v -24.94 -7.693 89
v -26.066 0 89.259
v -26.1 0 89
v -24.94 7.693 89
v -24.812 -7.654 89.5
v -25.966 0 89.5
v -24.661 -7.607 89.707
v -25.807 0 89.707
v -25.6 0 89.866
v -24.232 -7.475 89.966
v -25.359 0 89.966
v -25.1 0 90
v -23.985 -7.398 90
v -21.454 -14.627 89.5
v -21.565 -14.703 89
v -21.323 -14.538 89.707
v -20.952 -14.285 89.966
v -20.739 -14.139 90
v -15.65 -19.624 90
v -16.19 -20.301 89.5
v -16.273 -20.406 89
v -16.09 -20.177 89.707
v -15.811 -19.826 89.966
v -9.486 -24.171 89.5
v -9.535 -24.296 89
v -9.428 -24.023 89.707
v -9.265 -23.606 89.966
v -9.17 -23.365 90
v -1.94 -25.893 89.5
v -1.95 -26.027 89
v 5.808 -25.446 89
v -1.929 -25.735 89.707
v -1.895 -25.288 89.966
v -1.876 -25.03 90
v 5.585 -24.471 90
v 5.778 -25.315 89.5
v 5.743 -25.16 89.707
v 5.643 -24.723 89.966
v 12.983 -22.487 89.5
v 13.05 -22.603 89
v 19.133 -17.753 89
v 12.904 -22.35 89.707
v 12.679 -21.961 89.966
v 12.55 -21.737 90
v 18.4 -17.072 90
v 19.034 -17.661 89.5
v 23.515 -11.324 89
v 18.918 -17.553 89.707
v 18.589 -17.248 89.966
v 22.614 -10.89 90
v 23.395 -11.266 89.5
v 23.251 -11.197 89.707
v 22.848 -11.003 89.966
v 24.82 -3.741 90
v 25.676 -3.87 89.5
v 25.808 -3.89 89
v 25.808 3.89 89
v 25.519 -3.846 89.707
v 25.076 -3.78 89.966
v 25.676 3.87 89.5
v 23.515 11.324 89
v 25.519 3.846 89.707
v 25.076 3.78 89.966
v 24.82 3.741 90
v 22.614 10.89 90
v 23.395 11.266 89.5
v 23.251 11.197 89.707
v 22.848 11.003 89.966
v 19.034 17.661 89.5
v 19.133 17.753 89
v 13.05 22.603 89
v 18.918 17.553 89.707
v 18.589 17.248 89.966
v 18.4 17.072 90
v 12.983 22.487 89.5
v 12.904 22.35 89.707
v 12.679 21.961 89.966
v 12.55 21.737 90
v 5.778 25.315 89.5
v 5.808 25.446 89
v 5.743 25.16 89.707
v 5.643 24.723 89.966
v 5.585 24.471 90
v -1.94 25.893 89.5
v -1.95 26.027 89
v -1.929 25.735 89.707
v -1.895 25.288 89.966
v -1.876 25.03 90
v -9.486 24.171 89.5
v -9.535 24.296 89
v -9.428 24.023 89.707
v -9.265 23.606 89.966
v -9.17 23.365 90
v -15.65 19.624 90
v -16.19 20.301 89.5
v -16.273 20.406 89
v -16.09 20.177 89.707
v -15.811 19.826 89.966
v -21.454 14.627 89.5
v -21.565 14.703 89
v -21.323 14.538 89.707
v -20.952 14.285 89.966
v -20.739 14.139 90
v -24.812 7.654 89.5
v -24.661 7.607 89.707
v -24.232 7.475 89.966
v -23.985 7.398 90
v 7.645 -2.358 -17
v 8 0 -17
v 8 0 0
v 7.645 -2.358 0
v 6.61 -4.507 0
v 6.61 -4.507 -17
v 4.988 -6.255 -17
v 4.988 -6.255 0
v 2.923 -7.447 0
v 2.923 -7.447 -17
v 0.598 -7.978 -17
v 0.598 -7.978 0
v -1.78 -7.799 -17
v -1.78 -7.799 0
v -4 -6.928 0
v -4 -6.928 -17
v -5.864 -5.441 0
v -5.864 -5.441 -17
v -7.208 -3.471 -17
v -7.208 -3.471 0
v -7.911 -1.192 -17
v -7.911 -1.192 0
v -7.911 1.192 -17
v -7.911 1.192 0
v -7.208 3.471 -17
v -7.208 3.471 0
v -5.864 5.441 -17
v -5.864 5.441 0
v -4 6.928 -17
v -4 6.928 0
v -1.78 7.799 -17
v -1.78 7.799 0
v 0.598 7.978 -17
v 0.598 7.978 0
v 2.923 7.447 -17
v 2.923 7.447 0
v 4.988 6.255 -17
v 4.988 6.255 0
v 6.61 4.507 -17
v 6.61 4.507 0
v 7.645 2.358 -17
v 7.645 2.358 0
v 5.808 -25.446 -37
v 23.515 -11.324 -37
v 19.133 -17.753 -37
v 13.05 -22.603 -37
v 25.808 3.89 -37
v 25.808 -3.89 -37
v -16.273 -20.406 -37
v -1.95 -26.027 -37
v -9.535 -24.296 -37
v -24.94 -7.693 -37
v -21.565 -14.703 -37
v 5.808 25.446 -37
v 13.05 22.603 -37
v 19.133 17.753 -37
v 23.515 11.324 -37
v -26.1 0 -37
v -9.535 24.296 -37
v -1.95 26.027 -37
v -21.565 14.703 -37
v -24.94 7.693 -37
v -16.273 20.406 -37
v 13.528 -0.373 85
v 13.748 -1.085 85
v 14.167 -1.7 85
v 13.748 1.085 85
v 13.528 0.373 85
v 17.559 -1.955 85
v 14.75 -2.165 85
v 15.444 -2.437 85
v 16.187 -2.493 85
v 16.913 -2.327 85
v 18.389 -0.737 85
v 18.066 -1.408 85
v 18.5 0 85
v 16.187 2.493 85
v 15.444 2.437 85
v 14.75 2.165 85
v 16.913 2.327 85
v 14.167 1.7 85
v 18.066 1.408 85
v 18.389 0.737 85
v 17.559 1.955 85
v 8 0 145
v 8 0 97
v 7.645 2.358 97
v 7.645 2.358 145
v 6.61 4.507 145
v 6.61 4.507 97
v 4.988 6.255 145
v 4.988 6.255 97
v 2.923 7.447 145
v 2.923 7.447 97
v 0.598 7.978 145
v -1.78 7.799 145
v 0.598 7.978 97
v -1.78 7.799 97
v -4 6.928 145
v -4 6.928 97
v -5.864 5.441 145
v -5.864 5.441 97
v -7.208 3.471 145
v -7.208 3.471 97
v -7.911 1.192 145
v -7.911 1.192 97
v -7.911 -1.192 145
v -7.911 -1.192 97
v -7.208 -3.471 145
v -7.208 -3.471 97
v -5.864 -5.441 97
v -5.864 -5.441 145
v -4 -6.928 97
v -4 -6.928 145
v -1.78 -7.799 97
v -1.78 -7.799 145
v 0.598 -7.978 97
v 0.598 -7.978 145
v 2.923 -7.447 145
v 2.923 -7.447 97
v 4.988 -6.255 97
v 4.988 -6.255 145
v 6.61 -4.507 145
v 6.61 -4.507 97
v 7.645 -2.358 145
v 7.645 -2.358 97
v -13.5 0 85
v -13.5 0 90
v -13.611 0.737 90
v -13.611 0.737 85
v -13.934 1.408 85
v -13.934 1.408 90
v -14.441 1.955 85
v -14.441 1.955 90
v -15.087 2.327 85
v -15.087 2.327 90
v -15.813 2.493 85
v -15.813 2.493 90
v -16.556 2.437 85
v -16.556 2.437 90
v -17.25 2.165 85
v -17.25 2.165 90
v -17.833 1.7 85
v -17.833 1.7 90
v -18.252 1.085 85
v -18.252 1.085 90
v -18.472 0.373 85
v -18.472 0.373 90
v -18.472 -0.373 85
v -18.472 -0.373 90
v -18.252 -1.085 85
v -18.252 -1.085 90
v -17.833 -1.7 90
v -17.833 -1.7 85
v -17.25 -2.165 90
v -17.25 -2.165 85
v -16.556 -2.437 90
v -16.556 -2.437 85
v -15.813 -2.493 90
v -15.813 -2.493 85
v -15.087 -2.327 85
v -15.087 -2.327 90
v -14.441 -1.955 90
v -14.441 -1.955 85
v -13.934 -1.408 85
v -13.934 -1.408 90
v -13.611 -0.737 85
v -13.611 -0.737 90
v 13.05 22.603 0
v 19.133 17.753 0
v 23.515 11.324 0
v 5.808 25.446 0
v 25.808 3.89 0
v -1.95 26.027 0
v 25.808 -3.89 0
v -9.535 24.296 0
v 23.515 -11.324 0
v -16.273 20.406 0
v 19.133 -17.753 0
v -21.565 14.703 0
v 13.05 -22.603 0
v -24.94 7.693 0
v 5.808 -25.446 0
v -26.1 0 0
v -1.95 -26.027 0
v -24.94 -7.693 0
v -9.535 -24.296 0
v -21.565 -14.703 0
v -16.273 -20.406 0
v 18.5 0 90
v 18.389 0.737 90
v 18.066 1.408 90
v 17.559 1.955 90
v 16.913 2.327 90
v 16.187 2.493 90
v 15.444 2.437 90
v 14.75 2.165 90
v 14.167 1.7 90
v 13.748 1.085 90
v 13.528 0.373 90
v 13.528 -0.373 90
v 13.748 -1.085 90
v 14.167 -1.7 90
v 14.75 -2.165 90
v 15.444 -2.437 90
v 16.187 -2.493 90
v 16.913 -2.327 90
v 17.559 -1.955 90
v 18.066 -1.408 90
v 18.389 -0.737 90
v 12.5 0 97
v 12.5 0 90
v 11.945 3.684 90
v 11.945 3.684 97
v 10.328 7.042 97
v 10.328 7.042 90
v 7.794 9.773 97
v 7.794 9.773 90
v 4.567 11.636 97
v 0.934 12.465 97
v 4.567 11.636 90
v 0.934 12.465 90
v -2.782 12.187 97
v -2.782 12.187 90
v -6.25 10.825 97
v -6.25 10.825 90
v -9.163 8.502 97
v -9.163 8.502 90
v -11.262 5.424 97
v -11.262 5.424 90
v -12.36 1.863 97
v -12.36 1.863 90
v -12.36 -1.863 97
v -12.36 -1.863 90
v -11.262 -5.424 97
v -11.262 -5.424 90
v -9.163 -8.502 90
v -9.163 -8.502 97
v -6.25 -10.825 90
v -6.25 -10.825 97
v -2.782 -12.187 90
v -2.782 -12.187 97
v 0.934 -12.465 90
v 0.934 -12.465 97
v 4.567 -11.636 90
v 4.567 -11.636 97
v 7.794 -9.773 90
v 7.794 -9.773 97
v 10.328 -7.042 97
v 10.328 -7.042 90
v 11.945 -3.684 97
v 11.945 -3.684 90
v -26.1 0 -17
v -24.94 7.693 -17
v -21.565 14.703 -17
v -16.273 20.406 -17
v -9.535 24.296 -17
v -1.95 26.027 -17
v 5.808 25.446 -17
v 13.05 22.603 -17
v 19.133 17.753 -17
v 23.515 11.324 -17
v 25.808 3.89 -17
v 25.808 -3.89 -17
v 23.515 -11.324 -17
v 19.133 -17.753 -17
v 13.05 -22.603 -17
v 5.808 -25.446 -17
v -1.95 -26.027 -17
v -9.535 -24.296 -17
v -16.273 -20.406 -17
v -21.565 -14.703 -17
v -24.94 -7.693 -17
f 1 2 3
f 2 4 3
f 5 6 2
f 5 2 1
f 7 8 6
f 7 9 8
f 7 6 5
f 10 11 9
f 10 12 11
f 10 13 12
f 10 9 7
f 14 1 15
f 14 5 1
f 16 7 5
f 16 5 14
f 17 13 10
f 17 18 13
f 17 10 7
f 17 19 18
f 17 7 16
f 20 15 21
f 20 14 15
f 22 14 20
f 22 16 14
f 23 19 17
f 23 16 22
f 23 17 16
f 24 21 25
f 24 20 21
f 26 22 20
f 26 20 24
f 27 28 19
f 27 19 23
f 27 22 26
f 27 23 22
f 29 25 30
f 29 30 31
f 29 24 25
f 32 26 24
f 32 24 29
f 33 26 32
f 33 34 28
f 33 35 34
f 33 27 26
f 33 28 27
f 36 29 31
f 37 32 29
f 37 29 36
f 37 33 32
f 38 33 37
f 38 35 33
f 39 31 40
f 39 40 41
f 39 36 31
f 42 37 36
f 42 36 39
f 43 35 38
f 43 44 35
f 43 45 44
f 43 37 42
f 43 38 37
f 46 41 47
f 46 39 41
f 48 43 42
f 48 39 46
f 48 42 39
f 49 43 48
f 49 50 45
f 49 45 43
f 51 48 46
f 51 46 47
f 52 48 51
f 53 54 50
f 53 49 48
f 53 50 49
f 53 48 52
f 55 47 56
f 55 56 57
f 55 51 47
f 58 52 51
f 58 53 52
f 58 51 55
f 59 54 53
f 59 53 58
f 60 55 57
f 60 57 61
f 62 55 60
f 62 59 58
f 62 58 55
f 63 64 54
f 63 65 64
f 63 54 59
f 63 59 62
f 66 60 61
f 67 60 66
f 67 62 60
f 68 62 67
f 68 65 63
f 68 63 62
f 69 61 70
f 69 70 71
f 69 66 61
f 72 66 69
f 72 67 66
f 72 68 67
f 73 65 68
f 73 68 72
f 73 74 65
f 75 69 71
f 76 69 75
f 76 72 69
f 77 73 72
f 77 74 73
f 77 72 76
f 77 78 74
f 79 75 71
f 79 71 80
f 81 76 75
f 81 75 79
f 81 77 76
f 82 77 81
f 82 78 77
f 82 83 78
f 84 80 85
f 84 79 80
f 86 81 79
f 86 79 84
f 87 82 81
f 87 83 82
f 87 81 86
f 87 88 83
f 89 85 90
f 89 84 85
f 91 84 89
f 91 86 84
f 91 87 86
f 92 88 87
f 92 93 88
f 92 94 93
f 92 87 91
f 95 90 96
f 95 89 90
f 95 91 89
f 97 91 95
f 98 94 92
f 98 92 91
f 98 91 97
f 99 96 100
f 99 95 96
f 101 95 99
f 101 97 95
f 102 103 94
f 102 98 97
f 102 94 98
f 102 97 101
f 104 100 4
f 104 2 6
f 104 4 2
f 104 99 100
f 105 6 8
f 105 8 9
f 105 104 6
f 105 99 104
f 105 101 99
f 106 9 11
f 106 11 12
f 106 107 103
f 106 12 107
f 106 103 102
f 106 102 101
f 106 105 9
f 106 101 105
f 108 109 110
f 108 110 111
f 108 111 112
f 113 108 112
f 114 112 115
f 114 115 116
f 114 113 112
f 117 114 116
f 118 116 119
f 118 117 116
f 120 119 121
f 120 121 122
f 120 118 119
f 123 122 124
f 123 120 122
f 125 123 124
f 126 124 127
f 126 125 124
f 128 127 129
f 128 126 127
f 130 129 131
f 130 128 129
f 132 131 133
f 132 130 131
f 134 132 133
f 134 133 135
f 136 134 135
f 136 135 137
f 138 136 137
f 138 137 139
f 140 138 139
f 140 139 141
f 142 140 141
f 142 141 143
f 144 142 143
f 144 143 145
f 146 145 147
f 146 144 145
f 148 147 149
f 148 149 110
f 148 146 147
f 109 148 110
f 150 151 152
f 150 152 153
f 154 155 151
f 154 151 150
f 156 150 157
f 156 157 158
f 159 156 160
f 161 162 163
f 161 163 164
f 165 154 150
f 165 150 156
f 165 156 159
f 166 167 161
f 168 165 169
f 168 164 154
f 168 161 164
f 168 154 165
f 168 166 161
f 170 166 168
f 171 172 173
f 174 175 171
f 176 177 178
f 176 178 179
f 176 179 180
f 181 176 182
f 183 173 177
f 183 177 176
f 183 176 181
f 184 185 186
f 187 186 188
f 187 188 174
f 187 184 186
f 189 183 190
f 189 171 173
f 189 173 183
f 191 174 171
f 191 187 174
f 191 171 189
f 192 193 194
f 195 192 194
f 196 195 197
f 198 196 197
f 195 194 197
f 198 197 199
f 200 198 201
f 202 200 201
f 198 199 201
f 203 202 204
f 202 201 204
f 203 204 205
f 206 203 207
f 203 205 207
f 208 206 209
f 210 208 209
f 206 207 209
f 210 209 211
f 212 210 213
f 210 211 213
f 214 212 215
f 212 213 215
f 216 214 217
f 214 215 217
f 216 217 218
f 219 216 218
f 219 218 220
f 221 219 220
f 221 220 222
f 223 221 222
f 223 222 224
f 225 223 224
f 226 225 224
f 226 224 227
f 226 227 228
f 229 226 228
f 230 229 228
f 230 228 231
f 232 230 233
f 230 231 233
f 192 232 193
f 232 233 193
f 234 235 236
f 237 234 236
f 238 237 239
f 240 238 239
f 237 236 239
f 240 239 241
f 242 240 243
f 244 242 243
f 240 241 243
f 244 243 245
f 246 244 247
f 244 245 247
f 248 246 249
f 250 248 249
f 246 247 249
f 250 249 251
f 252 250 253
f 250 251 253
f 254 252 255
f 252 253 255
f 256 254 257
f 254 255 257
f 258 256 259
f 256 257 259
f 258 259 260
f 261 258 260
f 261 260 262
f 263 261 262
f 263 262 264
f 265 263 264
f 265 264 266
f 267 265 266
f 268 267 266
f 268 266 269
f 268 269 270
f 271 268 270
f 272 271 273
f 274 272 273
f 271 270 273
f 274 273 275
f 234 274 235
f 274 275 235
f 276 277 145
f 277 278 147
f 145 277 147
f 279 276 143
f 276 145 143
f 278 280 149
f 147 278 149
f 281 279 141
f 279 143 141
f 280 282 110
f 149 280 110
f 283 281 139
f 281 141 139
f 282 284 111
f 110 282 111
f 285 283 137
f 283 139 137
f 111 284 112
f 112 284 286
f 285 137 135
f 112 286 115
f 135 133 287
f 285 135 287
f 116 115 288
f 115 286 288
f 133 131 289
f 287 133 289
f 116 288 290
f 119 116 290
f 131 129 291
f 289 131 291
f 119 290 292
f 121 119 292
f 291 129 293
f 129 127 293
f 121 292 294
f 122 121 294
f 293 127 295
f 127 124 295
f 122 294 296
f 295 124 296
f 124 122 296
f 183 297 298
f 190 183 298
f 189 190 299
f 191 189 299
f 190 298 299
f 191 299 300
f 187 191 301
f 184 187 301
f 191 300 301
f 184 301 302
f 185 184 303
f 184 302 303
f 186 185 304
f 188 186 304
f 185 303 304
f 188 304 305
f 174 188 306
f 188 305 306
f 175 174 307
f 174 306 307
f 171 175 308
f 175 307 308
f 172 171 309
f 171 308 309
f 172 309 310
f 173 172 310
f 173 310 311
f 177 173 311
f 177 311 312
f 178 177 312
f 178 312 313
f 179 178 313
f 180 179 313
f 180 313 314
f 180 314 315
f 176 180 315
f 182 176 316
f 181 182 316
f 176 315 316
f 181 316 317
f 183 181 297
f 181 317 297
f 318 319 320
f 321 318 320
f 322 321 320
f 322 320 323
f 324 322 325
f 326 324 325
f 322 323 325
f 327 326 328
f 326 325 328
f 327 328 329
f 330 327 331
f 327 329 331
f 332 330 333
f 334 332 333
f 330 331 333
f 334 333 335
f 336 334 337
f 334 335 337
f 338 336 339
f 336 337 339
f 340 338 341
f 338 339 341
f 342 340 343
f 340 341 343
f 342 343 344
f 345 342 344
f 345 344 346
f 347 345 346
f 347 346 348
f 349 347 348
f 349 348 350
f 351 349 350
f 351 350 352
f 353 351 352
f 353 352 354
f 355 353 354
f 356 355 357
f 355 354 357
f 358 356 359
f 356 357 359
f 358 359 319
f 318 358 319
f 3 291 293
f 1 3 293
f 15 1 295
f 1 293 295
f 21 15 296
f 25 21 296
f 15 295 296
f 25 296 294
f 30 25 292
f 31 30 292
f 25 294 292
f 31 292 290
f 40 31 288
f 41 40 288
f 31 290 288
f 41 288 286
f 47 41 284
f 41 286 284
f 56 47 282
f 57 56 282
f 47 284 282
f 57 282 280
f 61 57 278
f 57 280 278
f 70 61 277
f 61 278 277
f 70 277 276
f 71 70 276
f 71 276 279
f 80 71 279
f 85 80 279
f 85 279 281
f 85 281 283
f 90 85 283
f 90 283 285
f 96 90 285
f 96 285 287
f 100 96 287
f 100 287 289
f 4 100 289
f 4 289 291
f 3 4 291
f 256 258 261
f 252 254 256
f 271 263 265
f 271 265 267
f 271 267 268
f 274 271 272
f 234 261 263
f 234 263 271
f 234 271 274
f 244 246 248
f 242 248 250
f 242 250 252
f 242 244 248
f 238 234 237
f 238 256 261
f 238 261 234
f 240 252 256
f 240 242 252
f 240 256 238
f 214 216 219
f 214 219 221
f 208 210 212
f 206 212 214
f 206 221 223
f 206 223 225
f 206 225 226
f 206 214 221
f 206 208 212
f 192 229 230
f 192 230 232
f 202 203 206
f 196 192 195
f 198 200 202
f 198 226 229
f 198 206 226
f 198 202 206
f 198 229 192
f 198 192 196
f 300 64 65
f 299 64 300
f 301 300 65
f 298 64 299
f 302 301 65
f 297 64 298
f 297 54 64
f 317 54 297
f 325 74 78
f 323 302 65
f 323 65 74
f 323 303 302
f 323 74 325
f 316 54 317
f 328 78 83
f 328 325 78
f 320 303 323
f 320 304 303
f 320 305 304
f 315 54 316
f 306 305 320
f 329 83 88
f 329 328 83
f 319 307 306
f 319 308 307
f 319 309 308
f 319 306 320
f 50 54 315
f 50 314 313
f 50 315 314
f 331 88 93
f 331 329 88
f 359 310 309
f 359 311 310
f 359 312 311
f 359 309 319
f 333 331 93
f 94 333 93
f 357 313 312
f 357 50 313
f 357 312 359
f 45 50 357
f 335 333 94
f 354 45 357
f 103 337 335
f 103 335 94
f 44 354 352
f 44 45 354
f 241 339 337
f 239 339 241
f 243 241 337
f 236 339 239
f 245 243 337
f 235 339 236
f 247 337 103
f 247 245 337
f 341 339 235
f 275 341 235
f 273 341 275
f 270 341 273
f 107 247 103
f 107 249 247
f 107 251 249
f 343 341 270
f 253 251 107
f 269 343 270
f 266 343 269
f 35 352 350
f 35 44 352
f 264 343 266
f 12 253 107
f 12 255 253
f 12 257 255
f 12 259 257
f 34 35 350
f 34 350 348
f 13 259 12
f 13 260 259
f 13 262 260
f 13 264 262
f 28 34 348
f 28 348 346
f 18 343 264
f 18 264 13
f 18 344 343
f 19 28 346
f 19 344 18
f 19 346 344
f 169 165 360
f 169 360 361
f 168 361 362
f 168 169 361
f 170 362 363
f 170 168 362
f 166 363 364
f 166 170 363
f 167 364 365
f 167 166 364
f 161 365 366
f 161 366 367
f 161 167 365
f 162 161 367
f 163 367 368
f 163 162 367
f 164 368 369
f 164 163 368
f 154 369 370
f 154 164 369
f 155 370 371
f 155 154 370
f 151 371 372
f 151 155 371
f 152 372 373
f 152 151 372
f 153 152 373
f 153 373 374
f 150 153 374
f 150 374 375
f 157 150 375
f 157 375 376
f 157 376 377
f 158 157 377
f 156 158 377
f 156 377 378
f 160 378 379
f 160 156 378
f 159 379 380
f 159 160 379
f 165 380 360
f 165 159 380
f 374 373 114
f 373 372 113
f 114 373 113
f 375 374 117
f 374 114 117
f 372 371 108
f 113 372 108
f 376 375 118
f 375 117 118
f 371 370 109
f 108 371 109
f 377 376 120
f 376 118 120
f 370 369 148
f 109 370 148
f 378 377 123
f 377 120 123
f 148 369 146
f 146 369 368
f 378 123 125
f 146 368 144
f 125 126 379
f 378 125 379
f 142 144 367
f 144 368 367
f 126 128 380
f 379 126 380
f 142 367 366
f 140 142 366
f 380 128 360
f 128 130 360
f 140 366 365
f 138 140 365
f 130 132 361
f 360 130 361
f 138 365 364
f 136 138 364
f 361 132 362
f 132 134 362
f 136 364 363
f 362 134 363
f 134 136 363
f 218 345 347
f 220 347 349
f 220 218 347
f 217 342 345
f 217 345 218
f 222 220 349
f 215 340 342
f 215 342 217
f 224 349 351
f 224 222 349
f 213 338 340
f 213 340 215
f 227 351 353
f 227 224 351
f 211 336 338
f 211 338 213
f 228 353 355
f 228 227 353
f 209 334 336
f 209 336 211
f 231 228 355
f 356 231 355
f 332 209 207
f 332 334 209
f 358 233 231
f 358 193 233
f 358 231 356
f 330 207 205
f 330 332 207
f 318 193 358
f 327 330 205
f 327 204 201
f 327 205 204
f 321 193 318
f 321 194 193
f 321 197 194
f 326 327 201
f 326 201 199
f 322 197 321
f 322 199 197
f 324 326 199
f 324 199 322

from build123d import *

# Parameters (mm, degrees)
SKETCH_1_R          = 26.1
EXTRUDE_1_DEPTH     = 90
FILLET_1_R          = 1
SKETCH_2_R          = 12.5
EXTRUDE_2_DEPTH     = 7
SKETCH_3_R          = 8
EXTRUDE_3_DEPTH     = 48
SKETCH_4_R          = 2.5
CUT_EXTRUDE_1_DEPTH = 5
SKETCH_1_2_R        = 26.1
EXTRUDE_4_DEPTH     = 10
EXTRUDE_START       = 17
SKETCH_6_R          = 8
EXTRUDE_5_DEPTH     = 17
EXTRUDE_START_2     = 20
SKETCH_7_R          = 26.1
EXTRUDE_6_DEPTH     = 20


with BuildPart() as part:
    # 草图1 → 凸台-拉伸1 (new body)
    with BuildSketch(Plane.XY):
        Circle(SKETCH_1_R)
    extrude(amount=EXTRUDE_1_DEPTH)

    # 圆角1
    fillet_1_edges = [part.edges().sort_by_distance(p)[0] for p in [
        (-26.1, 0, 90),
    ]]
    fillet(fillet_1_edges, radius=FILLET_1_R)

    # 草图2 → 凸台-拉伸2 (add)
    with BuildSketch(Plane.XY.offset(90)):
        Circle(SKETCH_2_R)
    extrude(amount=EXTRUDE_2_DEPTH)

    # 草图3 → 凸台-拉伸3 (add)
    with BuildSketch(Plane.XY.offset(97)):
        Circle(SKETCH_3_R)
    extrude(amount=EXTRUDE_3_DEPTH)

    # 草图4 → 切除-拉伸1 (cut)
    with BuildSketch(Plane.XY.offset(90)):
        with Locations((-16, 0)):
            Circle(SKETCH_4_R)
        with Locations((16, 0)):
            Circle(SKETCH_4_R)
    extrude(amount=-CUT_EXTRUDE_1_DEPTH, mode=Mode.SUBTRACT)

    # 草图1<2> → 凸台-拉伸4 (add)
    with BuildSketch(Plane.XY):
        Circle(SKETCH_1_2_R)
    extrude(amount=EXTRUDE_4_DEPTH)

    # 草图6 → 凸台-拉伸5 (add)
    with BuildSketch(Plane(origin=(0, 0, 0), x_dir=(-1, 0, 0), z_dir=(0, 0, -1)).offset(EXTRUDE_START)):
        Circle(SKETCH_6_R)
    extrude(amount=-EXTRUDE_5_DEPTH)

    # 草图7 → 凸台-拉伸6 (add)
    with BuildSketch(Plane(origin=(0, 0, -17), x_dir=(-1, 0, 0), z_dir=(0, 0, -1)).offset(EXTRUDE_START_2)):
        Circle(SKETCH_7_R)
    extrude(amount=-EXTRUDE_6_DEPTH)


solid = part.part
